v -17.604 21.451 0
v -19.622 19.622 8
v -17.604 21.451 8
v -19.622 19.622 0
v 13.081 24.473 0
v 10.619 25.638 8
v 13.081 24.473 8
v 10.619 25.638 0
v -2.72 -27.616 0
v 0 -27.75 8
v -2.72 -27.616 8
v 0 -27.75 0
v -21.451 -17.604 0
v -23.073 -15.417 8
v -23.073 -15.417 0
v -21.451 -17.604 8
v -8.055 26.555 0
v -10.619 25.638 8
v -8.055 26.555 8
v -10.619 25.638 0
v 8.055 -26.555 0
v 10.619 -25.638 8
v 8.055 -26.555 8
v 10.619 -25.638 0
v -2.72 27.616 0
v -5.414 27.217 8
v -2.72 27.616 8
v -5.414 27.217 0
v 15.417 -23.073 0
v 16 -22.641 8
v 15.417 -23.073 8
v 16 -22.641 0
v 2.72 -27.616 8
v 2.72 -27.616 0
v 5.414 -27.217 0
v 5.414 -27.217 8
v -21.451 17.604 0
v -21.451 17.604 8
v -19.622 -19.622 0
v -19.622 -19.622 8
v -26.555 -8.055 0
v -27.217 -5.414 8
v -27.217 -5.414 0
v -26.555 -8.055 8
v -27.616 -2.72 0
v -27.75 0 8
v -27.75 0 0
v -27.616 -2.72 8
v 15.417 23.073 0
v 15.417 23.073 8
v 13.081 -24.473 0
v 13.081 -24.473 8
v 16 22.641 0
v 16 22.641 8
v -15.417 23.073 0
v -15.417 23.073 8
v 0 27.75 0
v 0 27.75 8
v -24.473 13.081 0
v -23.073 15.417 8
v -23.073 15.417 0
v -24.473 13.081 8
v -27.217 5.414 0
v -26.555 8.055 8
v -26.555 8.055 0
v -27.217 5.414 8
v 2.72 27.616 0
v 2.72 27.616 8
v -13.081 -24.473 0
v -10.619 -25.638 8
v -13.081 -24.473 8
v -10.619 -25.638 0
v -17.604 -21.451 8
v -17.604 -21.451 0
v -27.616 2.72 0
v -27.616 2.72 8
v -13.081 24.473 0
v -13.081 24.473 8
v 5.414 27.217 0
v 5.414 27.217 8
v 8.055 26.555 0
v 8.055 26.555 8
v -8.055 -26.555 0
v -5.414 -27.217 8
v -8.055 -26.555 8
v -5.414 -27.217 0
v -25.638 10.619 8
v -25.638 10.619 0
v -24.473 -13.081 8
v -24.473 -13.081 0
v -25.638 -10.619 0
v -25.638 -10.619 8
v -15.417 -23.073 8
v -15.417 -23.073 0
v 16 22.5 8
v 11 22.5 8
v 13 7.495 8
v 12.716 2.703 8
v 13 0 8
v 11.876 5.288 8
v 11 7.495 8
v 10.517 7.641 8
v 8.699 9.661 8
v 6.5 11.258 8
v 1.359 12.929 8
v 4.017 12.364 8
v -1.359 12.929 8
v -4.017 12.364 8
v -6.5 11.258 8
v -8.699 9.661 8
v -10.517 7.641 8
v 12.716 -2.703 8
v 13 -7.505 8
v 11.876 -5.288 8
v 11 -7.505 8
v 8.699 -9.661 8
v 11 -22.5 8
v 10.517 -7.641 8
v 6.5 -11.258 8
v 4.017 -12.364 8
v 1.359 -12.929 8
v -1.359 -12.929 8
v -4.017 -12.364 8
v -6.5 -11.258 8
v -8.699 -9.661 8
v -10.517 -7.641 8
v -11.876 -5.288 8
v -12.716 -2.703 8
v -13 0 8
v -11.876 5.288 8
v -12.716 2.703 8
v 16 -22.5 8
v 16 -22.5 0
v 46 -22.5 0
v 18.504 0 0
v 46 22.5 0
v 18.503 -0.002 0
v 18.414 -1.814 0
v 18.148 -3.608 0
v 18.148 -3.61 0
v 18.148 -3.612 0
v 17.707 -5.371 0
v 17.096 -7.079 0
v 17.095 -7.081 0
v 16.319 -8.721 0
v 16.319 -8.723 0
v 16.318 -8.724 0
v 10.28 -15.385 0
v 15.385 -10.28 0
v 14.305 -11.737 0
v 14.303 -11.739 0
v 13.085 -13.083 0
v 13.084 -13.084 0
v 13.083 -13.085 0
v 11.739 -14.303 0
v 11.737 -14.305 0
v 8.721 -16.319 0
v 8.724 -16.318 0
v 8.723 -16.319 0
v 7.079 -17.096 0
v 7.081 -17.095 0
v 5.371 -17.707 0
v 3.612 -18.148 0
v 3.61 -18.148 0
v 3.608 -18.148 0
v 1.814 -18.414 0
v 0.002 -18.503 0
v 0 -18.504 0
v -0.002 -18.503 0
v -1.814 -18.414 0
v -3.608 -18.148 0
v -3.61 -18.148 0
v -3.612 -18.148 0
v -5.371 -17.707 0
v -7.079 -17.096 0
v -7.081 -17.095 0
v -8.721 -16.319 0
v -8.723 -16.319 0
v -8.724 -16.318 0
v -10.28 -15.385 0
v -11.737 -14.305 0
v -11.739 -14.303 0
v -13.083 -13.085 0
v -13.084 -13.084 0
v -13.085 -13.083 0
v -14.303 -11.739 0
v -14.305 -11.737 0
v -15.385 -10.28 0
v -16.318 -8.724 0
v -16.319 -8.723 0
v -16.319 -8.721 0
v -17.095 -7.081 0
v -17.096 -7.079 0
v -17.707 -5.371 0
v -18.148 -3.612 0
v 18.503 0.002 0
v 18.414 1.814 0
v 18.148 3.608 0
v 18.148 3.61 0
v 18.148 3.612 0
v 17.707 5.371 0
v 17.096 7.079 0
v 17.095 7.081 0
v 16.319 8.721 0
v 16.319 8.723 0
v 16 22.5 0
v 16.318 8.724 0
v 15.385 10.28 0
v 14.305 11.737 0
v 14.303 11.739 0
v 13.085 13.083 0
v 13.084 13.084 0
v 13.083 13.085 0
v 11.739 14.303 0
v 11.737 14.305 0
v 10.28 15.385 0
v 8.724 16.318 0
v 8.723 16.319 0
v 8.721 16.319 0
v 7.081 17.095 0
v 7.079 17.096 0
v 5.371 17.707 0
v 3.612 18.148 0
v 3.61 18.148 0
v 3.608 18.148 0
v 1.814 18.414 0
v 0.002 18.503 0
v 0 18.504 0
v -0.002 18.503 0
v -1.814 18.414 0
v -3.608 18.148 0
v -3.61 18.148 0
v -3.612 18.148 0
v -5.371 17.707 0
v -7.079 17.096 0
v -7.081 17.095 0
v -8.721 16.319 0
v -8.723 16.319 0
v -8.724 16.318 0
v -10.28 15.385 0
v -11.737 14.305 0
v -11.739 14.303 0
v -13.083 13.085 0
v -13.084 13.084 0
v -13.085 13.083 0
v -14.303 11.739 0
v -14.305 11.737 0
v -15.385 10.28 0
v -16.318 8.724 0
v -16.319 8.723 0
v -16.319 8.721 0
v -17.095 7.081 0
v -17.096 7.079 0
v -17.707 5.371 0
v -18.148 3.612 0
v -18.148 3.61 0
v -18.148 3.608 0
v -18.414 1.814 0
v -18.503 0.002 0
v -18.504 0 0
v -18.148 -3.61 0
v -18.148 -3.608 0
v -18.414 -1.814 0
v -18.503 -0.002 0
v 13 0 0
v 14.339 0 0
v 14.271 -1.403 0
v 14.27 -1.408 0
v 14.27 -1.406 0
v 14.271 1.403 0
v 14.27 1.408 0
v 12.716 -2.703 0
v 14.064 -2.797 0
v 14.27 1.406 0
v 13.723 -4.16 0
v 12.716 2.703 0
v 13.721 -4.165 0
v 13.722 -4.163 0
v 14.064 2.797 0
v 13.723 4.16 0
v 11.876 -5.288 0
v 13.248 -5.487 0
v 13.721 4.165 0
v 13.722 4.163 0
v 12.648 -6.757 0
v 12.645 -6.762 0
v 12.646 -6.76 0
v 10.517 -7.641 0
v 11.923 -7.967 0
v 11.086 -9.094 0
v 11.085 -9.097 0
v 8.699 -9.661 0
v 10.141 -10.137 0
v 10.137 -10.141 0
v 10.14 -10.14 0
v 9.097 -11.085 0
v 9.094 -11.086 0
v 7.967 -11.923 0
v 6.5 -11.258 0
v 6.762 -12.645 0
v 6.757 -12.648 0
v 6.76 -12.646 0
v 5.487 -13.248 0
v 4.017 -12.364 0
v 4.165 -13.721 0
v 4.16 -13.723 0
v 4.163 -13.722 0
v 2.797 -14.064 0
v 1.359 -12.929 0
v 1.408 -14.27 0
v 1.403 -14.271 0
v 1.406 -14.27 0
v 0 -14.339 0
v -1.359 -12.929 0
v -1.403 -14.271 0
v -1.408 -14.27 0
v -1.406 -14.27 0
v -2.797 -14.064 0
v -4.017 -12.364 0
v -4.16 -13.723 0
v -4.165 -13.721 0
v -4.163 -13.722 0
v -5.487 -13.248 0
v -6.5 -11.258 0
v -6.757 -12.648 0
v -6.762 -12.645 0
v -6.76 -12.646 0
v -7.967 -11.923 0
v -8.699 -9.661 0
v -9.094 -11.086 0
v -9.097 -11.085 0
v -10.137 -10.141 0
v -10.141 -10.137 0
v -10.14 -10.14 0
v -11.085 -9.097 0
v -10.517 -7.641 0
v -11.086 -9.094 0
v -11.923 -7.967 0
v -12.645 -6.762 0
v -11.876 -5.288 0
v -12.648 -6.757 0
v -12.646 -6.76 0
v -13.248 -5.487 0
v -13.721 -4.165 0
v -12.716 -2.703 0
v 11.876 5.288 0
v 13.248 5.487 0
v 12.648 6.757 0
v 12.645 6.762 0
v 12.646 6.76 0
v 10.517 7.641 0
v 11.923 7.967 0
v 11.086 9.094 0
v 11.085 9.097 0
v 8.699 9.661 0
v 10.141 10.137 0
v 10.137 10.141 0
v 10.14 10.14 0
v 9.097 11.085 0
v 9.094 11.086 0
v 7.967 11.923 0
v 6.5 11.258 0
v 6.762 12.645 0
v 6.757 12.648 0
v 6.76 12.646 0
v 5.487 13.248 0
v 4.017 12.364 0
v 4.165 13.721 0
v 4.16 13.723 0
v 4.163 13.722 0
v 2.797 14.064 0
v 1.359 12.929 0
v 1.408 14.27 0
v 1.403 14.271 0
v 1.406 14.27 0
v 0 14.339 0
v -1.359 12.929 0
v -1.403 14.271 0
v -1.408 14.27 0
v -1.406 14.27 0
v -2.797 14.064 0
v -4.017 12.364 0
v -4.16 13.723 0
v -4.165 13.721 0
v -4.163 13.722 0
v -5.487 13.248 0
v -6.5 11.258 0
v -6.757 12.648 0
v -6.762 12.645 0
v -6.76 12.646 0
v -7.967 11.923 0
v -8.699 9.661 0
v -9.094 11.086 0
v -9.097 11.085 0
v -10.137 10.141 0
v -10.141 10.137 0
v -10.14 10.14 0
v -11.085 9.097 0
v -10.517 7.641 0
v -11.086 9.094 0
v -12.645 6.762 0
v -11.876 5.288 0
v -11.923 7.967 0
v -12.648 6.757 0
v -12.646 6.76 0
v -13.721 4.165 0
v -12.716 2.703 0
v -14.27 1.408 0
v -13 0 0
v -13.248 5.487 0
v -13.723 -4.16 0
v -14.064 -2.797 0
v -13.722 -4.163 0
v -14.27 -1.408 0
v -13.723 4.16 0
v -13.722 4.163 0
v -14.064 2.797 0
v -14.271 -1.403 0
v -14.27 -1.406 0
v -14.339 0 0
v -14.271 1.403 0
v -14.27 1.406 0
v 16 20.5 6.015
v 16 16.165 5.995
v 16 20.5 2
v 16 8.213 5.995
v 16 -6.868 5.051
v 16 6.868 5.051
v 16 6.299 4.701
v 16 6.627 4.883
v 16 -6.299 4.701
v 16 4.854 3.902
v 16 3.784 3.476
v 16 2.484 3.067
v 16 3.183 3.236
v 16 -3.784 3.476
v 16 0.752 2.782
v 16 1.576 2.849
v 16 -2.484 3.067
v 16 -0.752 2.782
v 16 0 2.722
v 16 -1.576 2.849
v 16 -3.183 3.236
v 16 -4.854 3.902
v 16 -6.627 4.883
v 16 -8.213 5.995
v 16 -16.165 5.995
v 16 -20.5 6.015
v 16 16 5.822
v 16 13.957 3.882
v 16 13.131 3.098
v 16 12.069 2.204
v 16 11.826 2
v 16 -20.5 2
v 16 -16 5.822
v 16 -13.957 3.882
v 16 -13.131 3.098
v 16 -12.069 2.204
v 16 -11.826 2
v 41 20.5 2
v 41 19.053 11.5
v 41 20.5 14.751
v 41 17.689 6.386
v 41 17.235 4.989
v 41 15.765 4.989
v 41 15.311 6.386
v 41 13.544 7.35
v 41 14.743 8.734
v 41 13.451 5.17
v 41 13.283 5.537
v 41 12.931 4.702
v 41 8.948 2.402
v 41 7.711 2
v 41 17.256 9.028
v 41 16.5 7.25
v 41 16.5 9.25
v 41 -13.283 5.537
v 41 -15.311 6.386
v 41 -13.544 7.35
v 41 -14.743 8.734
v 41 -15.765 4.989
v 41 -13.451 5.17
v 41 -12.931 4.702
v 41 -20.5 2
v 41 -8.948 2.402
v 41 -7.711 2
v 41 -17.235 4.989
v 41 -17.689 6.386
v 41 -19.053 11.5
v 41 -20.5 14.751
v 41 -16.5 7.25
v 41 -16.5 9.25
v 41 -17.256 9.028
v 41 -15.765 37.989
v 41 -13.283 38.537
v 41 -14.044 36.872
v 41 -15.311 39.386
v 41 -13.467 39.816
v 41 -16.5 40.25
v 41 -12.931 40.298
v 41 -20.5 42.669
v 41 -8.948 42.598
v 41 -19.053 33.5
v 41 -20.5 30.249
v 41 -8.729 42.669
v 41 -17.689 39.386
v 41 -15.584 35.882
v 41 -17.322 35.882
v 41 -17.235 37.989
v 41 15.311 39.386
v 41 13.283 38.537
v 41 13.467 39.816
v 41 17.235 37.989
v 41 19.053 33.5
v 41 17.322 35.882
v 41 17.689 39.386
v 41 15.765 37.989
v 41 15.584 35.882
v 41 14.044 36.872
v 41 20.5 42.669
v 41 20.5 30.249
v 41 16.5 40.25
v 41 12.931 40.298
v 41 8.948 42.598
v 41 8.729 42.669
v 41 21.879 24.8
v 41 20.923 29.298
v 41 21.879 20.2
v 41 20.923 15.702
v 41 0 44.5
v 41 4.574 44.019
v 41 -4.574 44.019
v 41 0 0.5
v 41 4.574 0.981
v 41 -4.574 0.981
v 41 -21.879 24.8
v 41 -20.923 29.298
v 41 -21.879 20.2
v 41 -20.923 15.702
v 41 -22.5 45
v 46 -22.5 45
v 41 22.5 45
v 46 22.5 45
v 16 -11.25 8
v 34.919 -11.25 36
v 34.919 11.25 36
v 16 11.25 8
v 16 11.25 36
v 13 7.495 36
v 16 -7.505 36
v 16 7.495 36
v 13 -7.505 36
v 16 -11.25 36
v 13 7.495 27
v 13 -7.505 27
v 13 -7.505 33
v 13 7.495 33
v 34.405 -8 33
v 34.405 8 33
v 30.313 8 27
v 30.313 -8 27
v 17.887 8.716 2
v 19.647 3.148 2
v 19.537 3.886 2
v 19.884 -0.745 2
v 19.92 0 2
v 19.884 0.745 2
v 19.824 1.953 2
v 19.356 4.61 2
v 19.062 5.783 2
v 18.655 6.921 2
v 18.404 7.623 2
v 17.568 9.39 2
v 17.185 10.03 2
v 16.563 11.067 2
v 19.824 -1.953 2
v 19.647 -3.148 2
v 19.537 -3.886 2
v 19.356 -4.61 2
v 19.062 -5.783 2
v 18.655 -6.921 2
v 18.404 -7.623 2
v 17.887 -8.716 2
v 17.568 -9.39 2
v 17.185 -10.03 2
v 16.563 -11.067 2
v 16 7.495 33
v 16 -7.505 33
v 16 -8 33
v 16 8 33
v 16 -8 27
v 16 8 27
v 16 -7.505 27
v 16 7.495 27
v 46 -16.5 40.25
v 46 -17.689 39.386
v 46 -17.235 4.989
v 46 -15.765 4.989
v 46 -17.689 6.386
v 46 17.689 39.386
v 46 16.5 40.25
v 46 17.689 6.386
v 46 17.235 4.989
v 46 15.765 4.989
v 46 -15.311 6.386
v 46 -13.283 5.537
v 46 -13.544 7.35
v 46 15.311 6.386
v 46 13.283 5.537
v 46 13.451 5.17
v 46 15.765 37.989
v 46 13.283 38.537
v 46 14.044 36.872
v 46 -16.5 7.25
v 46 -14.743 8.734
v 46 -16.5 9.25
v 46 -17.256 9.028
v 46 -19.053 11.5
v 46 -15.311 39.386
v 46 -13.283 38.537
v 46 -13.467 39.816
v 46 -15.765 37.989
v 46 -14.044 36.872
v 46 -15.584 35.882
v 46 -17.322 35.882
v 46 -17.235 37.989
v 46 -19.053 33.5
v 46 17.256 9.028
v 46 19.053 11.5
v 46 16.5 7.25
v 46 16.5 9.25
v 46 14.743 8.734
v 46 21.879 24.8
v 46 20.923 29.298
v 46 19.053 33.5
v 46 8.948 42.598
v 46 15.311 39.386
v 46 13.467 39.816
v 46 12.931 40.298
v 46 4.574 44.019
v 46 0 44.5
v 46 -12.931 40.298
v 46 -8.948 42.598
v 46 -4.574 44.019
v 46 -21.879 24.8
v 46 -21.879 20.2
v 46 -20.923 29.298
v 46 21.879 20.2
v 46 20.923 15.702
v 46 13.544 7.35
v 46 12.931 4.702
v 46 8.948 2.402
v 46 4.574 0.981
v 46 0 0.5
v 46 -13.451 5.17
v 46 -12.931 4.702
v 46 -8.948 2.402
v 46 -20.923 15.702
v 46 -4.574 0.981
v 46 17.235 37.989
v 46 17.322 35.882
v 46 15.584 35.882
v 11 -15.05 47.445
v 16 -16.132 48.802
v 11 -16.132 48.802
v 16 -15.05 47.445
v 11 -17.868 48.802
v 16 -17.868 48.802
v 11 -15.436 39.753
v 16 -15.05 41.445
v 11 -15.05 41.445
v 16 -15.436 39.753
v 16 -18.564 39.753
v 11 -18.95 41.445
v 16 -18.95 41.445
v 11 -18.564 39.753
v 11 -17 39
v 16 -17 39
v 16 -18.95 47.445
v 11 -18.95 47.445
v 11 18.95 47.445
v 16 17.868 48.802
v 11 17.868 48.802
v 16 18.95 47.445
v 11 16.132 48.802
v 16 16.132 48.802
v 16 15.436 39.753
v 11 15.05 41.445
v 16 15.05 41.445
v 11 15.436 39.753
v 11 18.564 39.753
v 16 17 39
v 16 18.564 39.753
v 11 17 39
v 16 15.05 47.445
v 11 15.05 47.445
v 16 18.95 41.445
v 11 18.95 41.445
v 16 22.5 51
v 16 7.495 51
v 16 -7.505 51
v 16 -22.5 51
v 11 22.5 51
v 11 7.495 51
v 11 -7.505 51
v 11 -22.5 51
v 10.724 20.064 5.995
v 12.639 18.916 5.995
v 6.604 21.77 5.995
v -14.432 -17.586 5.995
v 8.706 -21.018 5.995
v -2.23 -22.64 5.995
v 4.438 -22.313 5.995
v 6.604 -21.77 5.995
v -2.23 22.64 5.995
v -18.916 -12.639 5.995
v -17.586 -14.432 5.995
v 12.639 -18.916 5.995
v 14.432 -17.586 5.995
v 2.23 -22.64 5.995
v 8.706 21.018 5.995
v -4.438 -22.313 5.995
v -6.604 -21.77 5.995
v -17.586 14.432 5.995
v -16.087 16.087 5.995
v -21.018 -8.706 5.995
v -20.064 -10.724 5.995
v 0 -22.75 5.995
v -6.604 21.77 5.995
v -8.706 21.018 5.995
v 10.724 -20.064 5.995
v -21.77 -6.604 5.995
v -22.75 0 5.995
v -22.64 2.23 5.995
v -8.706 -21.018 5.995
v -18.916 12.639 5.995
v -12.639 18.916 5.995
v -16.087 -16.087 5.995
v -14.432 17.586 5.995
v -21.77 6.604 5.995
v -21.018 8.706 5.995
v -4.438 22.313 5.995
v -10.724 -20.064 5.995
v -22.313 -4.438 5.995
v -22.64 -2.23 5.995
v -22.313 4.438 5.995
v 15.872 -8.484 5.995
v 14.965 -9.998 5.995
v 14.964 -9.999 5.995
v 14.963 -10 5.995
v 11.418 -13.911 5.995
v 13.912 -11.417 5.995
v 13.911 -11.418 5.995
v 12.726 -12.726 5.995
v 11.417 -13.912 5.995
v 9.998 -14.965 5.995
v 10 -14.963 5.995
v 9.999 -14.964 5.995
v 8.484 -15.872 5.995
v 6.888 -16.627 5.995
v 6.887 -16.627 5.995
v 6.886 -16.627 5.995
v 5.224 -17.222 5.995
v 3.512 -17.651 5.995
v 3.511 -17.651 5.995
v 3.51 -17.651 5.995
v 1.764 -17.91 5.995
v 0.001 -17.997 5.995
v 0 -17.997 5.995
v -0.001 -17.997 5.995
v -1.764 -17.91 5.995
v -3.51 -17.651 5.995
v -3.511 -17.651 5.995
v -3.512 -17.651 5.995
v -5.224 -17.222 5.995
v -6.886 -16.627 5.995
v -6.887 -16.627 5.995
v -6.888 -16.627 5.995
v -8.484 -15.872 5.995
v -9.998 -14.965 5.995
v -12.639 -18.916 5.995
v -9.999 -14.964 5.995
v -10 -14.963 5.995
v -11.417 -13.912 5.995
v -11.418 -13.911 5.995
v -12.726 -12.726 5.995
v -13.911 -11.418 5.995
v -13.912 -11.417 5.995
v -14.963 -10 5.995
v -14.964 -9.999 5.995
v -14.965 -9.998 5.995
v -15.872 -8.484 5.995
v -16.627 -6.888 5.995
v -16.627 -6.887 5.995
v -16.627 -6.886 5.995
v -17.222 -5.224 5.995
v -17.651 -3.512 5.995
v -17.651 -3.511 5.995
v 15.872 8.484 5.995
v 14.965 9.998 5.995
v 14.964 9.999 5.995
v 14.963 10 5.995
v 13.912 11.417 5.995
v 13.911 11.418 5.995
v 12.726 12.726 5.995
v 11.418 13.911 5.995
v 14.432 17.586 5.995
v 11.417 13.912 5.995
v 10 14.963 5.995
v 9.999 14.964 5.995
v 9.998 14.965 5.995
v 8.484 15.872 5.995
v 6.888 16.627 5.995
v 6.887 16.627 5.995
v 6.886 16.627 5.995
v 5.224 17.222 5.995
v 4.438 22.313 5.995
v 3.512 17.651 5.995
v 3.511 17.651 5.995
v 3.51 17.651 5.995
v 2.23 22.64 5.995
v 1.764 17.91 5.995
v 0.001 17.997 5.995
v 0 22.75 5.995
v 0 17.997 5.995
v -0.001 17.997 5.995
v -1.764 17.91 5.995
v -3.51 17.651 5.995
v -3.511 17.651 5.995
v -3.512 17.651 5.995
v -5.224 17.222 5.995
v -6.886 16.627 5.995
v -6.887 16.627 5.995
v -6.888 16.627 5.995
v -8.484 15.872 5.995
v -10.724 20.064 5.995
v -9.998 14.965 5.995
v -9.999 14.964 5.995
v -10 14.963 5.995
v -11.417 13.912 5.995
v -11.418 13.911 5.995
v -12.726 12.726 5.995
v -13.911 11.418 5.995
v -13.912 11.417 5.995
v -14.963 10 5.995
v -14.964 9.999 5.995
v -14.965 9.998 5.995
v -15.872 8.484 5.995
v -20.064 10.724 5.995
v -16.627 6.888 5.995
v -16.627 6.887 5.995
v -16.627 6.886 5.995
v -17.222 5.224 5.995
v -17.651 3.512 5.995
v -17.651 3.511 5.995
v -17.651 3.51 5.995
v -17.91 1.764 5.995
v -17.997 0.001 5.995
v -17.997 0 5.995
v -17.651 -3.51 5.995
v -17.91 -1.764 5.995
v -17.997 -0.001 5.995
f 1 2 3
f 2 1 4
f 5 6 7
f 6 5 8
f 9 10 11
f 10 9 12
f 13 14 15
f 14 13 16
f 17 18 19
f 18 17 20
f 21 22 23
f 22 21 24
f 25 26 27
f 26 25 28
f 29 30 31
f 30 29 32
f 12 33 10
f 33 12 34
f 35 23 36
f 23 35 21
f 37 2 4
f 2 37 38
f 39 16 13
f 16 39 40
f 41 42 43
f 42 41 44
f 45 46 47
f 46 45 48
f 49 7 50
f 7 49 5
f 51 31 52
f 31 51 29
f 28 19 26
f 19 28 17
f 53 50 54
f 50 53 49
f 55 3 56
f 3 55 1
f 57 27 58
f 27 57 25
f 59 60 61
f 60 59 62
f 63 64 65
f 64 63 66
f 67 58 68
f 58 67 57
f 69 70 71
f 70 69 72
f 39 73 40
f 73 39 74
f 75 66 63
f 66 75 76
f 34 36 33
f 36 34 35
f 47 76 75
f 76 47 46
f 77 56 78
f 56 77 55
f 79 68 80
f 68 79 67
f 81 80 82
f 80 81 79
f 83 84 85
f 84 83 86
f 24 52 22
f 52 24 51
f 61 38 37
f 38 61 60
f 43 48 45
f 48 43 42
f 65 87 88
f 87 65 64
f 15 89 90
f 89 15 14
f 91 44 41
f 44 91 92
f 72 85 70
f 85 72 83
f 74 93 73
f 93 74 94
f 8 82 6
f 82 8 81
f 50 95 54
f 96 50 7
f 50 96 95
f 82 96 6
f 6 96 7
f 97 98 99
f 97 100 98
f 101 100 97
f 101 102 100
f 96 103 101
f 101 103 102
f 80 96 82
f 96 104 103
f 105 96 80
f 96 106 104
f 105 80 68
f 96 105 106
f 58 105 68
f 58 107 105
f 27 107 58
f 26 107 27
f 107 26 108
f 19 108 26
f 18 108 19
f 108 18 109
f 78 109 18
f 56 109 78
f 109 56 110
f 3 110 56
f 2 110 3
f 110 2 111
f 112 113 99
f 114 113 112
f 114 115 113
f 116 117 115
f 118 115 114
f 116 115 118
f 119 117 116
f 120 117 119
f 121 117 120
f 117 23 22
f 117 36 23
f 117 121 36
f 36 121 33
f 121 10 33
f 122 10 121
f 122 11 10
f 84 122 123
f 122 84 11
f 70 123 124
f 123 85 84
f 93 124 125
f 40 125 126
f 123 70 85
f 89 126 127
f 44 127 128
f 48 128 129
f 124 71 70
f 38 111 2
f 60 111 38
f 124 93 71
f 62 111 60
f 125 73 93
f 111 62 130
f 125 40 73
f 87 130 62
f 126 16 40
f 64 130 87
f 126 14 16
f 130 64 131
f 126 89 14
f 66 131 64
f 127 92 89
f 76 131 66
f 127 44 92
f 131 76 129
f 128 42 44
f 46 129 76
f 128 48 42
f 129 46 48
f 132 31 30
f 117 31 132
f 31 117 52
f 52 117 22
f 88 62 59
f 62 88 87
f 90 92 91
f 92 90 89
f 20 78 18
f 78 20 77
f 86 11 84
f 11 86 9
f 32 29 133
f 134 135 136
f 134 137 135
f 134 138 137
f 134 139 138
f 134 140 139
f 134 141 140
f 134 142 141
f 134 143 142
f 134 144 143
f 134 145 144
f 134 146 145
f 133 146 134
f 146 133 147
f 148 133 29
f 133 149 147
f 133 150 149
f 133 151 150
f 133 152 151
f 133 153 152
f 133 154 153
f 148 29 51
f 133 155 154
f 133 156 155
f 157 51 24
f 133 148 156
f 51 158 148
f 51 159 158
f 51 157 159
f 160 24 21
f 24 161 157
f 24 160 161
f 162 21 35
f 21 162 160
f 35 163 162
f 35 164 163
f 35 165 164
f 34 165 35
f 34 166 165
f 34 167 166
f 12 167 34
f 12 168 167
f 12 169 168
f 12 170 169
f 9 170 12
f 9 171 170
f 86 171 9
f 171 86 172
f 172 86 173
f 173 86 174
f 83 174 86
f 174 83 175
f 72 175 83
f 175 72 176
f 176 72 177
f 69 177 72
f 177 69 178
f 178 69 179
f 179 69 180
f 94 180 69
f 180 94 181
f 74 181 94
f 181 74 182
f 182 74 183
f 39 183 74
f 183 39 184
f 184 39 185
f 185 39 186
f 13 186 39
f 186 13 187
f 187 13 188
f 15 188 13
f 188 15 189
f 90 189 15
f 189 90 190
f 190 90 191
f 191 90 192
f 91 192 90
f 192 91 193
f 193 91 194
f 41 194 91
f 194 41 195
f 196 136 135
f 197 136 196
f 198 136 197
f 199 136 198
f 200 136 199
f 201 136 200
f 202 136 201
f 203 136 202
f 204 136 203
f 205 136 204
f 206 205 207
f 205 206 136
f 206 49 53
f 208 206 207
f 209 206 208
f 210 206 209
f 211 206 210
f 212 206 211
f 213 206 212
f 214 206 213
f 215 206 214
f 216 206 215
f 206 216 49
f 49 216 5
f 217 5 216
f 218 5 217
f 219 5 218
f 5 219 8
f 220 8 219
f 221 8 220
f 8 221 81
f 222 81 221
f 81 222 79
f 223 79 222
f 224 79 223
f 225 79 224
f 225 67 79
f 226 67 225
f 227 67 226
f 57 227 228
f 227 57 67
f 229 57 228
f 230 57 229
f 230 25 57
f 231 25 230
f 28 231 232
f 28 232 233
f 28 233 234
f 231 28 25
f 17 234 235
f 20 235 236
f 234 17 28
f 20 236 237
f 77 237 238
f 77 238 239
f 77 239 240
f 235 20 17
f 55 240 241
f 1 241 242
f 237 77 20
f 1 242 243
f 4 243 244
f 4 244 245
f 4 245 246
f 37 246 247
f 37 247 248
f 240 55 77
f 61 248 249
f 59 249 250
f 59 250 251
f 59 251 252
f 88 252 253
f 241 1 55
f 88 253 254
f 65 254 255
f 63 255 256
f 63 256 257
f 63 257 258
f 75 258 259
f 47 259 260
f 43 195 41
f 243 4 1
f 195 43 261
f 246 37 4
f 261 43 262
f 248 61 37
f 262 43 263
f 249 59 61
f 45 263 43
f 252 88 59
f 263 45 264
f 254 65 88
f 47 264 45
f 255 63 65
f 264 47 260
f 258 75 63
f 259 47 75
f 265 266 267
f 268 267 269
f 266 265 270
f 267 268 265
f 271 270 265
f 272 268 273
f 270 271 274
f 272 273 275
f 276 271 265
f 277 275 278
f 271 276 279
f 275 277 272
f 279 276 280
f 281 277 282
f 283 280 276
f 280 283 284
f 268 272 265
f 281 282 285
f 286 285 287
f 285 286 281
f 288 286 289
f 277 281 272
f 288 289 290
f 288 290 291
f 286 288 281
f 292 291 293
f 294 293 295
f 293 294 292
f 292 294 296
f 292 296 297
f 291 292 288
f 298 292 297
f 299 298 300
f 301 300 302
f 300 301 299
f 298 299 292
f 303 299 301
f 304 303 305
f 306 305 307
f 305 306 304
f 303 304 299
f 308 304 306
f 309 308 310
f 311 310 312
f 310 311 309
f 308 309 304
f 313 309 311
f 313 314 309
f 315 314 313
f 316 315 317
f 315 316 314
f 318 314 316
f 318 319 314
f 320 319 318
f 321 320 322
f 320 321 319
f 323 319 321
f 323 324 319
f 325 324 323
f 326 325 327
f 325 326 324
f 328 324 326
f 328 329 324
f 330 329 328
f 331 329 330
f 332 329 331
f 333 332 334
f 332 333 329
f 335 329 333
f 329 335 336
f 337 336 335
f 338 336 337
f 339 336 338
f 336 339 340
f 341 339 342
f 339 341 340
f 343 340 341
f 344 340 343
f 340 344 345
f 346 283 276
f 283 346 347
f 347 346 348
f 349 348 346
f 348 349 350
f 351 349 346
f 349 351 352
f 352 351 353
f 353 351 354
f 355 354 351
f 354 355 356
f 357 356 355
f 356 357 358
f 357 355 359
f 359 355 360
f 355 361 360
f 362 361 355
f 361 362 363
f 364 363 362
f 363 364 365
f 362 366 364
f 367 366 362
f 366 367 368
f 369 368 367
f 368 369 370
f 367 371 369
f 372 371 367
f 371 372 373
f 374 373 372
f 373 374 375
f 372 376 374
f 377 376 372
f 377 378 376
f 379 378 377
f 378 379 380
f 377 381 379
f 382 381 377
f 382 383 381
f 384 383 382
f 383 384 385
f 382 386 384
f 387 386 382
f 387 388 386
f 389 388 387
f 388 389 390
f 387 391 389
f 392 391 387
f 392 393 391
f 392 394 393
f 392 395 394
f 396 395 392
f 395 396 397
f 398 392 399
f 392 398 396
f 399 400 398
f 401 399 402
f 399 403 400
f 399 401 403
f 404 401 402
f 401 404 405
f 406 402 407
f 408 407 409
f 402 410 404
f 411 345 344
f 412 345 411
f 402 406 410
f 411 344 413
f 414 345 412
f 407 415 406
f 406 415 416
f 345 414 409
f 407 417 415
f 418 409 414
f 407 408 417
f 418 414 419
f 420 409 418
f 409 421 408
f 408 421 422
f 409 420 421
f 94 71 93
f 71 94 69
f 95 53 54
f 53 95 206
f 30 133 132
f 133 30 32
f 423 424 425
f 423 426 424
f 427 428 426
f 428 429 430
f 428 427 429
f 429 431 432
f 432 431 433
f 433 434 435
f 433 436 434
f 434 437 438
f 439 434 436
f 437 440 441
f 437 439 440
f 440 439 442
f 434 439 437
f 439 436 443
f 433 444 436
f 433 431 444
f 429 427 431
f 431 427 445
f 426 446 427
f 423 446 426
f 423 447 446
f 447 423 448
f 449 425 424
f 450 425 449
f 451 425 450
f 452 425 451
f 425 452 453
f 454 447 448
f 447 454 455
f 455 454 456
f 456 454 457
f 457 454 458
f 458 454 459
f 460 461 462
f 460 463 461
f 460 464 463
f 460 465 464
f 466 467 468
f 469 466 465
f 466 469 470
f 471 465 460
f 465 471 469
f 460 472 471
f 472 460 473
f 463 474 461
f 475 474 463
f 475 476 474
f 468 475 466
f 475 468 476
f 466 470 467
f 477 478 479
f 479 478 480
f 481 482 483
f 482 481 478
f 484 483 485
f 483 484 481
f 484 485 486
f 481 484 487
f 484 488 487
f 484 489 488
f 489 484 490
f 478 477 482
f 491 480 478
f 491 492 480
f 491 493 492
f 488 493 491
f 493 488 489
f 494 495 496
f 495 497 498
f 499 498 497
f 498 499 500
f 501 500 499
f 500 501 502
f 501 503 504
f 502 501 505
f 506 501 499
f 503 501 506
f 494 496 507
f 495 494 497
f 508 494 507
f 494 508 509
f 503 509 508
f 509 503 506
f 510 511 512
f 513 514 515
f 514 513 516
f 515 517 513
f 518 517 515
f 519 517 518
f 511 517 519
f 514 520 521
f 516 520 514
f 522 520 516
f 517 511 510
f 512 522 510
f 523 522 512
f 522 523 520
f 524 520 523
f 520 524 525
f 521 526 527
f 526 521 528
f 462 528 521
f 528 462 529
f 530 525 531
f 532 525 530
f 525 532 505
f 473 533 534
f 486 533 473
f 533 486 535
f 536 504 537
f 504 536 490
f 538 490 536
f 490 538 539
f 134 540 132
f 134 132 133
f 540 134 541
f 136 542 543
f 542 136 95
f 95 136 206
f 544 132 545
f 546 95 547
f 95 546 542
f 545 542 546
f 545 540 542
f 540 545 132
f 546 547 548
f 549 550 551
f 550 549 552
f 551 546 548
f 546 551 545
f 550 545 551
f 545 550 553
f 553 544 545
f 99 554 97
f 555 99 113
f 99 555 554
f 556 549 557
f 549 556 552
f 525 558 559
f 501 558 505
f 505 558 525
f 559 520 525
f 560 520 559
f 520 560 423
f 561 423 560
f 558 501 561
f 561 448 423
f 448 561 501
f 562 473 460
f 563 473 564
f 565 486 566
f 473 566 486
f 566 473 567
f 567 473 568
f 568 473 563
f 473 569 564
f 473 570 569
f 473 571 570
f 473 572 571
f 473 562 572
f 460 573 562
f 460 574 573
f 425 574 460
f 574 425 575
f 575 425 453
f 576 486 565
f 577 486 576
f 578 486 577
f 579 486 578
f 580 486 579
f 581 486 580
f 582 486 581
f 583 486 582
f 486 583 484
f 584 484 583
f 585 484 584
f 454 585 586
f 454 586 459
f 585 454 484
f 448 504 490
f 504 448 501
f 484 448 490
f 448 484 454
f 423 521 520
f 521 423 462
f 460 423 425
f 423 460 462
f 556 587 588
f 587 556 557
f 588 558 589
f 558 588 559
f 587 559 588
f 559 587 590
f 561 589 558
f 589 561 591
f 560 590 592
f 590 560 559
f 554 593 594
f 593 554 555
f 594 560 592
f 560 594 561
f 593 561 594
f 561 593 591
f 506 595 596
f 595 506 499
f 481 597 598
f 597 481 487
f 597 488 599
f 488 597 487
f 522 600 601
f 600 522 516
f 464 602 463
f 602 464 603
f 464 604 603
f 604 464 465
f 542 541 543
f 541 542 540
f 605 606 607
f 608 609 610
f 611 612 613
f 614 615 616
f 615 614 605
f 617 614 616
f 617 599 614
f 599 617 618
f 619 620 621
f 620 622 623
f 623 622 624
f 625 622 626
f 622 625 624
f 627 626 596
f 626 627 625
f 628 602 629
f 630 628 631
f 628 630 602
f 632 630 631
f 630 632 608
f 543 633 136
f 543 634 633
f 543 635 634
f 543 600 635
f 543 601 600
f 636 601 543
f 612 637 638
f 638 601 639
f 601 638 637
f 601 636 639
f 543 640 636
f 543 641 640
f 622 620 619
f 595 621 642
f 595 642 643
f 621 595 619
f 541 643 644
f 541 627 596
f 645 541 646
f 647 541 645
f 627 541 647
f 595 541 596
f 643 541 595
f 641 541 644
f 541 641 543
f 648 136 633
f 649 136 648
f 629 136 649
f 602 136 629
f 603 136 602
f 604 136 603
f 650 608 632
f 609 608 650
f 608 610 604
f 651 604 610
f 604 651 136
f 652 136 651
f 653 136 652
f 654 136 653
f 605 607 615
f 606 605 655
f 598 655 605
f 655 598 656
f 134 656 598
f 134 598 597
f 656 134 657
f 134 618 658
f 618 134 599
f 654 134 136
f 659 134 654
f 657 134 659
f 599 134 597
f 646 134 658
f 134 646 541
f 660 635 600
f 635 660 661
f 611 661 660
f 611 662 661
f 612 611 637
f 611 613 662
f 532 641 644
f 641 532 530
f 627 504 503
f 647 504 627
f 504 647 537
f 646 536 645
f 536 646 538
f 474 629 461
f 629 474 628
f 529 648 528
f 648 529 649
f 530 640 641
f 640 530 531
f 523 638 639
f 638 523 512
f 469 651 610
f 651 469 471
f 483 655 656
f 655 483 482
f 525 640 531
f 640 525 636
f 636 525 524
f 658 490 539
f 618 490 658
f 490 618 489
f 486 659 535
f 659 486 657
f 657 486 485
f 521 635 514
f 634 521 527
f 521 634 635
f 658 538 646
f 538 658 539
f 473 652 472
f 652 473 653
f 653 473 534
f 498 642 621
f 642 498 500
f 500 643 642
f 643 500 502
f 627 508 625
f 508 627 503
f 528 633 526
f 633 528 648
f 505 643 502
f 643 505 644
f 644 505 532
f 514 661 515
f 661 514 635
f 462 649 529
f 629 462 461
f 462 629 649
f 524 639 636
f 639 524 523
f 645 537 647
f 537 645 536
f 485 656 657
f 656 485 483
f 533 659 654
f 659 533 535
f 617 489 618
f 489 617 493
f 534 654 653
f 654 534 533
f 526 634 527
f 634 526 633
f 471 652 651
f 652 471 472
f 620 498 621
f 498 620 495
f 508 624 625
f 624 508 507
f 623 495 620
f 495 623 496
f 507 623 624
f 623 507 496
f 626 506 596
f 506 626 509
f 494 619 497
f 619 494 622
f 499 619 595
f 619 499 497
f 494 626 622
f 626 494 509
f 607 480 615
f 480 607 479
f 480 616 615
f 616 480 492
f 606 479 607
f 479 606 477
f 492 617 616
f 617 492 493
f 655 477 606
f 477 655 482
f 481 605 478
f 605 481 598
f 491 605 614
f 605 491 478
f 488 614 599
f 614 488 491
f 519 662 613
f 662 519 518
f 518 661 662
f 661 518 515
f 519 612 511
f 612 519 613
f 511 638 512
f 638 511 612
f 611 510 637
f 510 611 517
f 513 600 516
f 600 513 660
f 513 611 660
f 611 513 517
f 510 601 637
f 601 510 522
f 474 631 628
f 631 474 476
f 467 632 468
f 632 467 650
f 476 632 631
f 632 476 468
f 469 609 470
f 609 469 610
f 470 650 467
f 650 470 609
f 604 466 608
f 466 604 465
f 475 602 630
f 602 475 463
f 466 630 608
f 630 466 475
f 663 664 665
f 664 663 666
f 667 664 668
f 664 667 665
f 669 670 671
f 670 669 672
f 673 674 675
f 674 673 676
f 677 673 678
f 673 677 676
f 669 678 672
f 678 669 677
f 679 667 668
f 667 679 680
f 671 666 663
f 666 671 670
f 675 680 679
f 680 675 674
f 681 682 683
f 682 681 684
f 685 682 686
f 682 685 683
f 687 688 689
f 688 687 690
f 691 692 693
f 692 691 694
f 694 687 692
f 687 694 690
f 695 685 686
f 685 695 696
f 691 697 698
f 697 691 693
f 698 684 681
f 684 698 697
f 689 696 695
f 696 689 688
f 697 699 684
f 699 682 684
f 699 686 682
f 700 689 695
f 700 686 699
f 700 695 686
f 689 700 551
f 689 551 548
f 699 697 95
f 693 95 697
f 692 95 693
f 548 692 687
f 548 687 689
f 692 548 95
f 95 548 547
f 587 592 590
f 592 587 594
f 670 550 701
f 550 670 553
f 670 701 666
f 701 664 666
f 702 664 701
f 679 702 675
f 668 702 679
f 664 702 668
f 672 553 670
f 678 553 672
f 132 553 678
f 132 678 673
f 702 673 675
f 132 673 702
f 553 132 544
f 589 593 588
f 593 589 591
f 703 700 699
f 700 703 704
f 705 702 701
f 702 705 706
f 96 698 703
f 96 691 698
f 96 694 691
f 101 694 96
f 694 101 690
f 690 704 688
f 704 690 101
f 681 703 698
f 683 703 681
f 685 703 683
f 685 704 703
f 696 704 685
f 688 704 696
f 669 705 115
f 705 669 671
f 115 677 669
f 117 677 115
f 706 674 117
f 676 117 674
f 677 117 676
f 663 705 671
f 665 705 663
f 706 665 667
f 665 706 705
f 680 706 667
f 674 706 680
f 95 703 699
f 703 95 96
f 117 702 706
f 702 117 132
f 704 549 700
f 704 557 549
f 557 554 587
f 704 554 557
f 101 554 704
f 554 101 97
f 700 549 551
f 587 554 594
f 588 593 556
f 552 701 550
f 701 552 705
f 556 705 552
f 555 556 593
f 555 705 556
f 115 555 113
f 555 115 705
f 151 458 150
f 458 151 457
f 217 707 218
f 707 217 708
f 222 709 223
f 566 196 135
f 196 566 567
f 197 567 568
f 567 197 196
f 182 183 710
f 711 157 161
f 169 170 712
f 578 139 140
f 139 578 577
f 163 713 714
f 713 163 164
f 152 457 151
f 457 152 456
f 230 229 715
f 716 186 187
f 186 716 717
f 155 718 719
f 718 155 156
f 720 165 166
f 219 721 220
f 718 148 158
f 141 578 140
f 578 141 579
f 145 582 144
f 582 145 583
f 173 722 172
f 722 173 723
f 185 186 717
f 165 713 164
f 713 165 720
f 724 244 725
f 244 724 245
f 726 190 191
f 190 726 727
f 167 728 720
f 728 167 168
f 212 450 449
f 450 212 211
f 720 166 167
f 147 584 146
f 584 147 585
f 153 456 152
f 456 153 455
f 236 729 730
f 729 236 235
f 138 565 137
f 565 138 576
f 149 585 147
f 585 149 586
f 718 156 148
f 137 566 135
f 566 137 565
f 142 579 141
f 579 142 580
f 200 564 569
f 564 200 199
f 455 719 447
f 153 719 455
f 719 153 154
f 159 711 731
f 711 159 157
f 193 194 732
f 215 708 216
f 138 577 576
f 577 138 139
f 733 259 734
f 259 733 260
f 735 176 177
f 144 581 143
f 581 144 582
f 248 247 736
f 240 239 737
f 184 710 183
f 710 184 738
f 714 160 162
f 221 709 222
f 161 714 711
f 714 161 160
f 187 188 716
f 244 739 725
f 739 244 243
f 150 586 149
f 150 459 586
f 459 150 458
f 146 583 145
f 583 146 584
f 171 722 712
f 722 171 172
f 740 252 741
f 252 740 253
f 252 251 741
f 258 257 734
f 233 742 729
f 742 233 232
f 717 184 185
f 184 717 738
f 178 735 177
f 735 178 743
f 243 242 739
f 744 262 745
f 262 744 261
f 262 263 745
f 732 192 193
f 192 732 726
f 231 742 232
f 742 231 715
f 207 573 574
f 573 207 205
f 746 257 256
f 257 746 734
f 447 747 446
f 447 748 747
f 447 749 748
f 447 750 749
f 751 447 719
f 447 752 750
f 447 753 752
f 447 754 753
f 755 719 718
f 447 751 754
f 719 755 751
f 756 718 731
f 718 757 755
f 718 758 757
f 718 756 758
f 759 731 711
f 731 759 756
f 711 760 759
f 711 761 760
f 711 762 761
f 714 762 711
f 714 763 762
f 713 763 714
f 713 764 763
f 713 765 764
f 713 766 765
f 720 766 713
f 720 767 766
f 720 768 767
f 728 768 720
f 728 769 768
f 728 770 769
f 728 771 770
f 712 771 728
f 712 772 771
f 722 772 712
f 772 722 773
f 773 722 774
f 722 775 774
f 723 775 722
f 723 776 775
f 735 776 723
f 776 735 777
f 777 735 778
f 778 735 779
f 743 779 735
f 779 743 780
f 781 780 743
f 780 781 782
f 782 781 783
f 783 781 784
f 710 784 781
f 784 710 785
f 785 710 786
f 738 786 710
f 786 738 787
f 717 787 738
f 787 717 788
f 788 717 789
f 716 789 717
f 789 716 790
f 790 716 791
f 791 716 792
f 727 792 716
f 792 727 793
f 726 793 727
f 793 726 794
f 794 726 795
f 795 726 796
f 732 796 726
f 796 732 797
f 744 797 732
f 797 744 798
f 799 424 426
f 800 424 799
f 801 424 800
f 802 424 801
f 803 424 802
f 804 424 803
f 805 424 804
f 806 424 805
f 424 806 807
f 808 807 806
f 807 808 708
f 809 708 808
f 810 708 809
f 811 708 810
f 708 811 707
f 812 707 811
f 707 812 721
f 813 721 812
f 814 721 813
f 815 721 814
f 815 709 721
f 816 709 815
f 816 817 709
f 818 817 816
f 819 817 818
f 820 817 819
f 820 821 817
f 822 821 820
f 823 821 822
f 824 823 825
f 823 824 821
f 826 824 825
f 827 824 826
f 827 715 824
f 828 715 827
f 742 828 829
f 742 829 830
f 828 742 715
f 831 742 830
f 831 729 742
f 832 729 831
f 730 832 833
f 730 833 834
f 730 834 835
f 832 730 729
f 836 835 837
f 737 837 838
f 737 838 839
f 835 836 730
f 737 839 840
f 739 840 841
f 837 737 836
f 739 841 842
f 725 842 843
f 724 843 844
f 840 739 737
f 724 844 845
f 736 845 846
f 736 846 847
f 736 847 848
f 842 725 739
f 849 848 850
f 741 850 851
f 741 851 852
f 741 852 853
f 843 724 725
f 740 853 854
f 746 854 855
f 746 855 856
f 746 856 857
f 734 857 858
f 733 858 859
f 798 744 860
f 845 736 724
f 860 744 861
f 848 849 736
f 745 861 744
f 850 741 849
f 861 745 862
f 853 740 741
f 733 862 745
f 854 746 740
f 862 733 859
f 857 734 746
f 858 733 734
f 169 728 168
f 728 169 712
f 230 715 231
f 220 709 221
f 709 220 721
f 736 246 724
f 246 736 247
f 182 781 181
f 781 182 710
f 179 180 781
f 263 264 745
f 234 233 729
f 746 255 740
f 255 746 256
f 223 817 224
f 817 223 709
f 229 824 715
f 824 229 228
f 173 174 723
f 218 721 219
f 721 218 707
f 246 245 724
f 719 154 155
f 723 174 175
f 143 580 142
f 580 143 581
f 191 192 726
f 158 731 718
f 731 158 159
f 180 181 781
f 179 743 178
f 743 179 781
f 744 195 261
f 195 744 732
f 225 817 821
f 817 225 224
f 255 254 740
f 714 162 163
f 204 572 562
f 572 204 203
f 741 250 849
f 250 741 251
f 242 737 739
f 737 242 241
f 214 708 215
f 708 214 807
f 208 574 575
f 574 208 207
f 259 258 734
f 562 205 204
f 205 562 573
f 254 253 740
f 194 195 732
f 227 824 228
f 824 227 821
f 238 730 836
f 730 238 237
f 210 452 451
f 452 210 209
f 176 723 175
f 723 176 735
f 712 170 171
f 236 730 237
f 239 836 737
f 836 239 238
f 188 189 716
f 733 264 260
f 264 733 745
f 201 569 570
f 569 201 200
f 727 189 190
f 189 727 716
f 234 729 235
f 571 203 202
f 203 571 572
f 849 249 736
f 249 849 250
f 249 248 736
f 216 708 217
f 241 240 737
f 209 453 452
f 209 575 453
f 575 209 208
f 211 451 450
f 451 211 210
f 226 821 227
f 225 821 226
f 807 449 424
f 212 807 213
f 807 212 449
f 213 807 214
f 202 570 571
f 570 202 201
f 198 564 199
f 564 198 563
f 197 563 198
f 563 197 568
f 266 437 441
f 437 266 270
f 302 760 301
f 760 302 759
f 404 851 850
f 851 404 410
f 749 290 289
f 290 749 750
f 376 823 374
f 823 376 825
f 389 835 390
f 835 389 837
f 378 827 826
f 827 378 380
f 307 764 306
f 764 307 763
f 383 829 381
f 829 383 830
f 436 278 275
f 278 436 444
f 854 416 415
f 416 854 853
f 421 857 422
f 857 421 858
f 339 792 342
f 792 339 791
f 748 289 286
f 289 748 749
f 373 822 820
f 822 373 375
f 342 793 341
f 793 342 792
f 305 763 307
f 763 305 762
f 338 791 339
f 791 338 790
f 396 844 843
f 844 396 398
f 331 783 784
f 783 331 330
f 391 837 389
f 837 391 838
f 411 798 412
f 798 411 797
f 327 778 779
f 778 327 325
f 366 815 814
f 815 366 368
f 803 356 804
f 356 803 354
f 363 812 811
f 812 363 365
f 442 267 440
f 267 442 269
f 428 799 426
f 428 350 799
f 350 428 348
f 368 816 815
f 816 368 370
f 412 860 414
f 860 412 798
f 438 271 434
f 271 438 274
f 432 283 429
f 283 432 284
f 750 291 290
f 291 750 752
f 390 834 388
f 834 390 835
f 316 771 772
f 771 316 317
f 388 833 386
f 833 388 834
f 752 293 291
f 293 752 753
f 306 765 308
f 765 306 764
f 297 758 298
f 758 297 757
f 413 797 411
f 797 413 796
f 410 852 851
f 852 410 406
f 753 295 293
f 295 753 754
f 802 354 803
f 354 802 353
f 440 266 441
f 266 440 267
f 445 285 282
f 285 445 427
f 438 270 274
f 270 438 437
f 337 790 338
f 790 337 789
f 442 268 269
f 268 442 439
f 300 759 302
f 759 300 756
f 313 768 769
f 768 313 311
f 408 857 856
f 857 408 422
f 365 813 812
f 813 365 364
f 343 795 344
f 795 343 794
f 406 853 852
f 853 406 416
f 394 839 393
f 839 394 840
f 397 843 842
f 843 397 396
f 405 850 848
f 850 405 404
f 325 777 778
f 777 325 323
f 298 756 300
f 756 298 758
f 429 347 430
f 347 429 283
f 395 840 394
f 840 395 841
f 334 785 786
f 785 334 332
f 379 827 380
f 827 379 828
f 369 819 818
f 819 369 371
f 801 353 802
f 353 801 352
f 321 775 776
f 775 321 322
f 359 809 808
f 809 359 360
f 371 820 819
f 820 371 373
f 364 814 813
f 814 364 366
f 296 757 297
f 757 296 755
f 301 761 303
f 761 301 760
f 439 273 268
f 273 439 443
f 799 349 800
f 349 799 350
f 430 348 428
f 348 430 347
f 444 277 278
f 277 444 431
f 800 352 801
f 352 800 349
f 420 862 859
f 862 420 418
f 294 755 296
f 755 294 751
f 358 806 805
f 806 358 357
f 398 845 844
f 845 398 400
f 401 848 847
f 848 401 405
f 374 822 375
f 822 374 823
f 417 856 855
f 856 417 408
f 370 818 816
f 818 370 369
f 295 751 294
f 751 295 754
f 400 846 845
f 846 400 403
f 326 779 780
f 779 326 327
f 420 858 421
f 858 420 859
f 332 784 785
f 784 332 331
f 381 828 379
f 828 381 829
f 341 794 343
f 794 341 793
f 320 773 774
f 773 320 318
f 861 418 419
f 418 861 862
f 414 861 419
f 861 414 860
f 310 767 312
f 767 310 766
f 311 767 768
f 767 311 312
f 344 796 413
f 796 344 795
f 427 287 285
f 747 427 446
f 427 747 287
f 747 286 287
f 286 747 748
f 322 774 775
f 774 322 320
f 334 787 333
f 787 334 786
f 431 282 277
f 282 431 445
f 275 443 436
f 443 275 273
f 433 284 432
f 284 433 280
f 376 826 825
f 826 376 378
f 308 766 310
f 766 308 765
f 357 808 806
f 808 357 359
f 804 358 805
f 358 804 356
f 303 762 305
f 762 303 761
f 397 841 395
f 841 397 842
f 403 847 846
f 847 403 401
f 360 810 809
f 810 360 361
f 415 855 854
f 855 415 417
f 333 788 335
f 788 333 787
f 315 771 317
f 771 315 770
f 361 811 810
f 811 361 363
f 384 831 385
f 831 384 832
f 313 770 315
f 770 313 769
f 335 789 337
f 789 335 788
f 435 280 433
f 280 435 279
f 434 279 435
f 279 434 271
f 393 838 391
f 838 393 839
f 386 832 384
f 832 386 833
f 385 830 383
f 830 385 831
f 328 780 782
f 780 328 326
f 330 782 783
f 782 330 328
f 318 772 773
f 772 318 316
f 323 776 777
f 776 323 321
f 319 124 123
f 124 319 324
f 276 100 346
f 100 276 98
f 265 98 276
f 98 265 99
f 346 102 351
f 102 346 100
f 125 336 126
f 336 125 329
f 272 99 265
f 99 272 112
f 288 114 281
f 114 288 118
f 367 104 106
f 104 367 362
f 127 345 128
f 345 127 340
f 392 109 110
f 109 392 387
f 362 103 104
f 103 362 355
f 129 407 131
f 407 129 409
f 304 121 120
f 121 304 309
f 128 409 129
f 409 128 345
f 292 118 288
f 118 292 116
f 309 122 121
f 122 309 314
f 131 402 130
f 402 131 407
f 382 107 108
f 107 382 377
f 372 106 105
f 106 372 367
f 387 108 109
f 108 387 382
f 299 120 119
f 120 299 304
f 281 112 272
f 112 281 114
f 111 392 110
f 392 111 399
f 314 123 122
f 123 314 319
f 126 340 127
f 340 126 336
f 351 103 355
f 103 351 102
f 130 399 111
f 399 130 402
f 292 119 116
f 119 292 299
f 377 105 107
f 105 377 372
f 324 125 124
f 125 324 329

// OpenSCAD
///////////////////////////////
// USER PARAMETERS
///////////////////////////////
bolt_dia=4;


blower_od =55.5;
blower_id=26;
blower_height=8;
blower_wall_thcikness=3;
blower_top_bottom_thickness=2;

duct_length=25;
duct_height=45;
duct_width=45;
duct_wall_thcikness=3;

slit_width=5;

fan_width=40;
fan_thickness=8 ;
fan_bolt_dia=2.5;
fan_bolt_dist=33;
fan_mount_angle=0;
fan_mount_thickness=5;

focus_dia= 32 ;
focus_aperture=5;

main_mount_bolt_dia=4;
main_mount_bolt_dist= 34;
main_mount_bolts_height=44;//distance between mount point and where the lower part of the blower should be
main_mount_height = main_mount_bolts_height+7-blower_height;
main_mount_thickness=5;

main_mount_center_dist=11;

cold_end_target_height=14;//negative, from mount points
cold_pt = main_mount_bolts_height-cold_end_target_height;
cold_tunnel_height=6;
cold_tunnel_wall_thickness=3;
cold_tunnerl_width=16;

echo("cold",cold_pt);
xtra=0.01;
// //////////////////////////////
//  USAGE EXAMPLE
// //////////////////////////////



fan_duct(blower_height);
//mounter();


			
		

// //////////////////////////////
// OpenSCAD SCRIPT
// //////////////////////////////
module fan_duct(height=10)
{
	
	duct_hole_width = duct_width -duct_wall_thcikness*2;

	blower_hole_height=blower_height-blower_top_bottom_thickness*2;

	duct_start_offset=blower_id/2;
	blower_cutoff_lng= blower_od/2 - duct_start_offset;

	blower_inner_height =blower_height-blower_top_bottom_thickness;
	blower_join_cut_width=blower_od-27;

	difference()
	{
		union()
		{
			difference()
			{
				cylinder(r=blower_od/2,h=height, $fn=64);
				translate([duct_start_offset+blower_wall_thcikness,-blower_od/2,-xtra/2])cube([blower_cutoff_lng,blower_od,height+xtra]);
				translate([duct_start_offset+blower_wall_thcikness,-blower_join_cut_width/2,blower_top_bottom_thickness-xtra/2])cube([blower_cutoff_lng,blower_join_cut_width,blower_hole_height+xtra]);
				
			}
			
			translate([duct_start_offset+duct_length+blower_wall_thcikness,0,0]) duct(duct_length,duct_width,fan_mount_angle);

			translate([main_mount_center_dist+main_mount_thickness/2,0,height])  mounter(main_mount_thickness);

		}
		
		//blower central hole
		translate([0,0,-xtra/2])   cylinder(r=blower_id/2,h=height +xtra);
		//blower inner hole
		translate([0,0,-xtra/2])  blower_hole(blower_inner_height);

		//cut off , helper
		//translate([0,0,-xtra/2])  cube([100,100,50]);
	}
}

module duct(length=60, width=45,front_angle=60, slope_length = 45,wall_thickness=2)
{
	height = sin(90-front_angle) * slope_length;
	offset= height / tan(90-front_angle);
	inner_offset= (height-wall_thickness*2) / tan(90-front_angle);
	
	echo(height);
	echo(offset);
	echo(inner_offset);

	cold_top= cold_pt+ cold_tunnel_height/2+cold_tunnel_wall_thickness;

	rotate([0,-90,90])
	difference()
	{
		union()
		{
		linear_extrude(height = width, center = true, convexity = 50, twist = 0)
		{
			polygon(points = 
			[[0,-offset]
			,[0,length]
			,[blower_height,length]
			,[height,0]
			]
			,paths = [[0,1,2,3]]);
		}

		//cold zone blower outer 
		linear_extrude(height = width/2, center = true, convexity = 50, twist = 0)
		{
			polygon(points = 
			[[cold_top,0]
			,[0,length+main_mount_thickness-2]
			,[cold_top,length+main_mount_thickness-2]
			]
			,paths = [[0,1,2]]);
		}
		
		}

		//duct inner hole
		linear_extrude(height = width-wall_thickness*2, center = true, convexity = 50, twist = 0)
		{
			polygon(points = 
			[[wall_thickness,-inner_offset-5]
			,[wall_thickness,length+xtra]
			,[blower_height-wall_thickness,length+xtra]
			,[height-wall_thickness+7,-5]
			]
			,paths = [[0,1,2,3]]);
		}

		//cold zone blower inner hole 
		translate([cold_top-cold_tunnel_height/2-cold_tunnel_wall_thickness,length/2,0])   cube([cold_tunnel_height,length*2,cold_tunnerl_width],center=true);

	}

	translate([offset,0,0])  
	rotate([0,90-front_angle,0])  fan_mount(thickness=fan_mount_thickness);

	
}


module fan_mount(width=45, thickness=10, mount_walls=2, center_hole_dia=44)
{
	translate([-duct_height/2,0,thickness/2]) rotate([0,90,0])
	{

	difference()
	{
		cube([thickness,width,duct_height],center=true);
		translate([-thickness/2-xtra/2,0,0])rotate([0,90,0]) cylinder(r=center_hole_dia/2,h=thickness+xtra);

		for(i= [-1,1]) for(j= [-1,1])
		translate([-thickness/2,i*fan_bolt_dist/2,j*fan_bolt_dist/2])
		rotate([0,90,0])translate([0,0,-xtra/2])cylinder(r=fan_bolt_dia/2,h=thickness+xtra);
	}
	
	
	for(i= [-1,1]) for(j= [-1,1])
	translate([-thickness/2,i*fan_bolt_dist/2,j*fan_bolt_dist/2])
	rotate([0,90,0])
	difference()
	{
		cylinder(r=fan_bolt_dia/2+mount_walls,h=thickness);
		translate([0,0,-xtra/2])cylinder(r=fan_bolt_dia/2,h=thickness+xtra);
	}
	}
}





module blower_hole(height=10)
{
	
	difference()
	{
		cylinder(r2=blower_od/2-blower_wall_thcikness-2, r1=focus_dia/2+focus_aperture/2, h=height , $fn=64 );
		translate([0,0,-xtra/2]) cylinder(r1=focus_dia/2-focus_aperture/3, r2 =blower_id/2+blower_wall_thcikness+2, h=height +xtra , $fn=64);
	}

	/*translate([0,0,-height])
	difference()
	{
		//cylinder(r2=focus_dia/2, r1=blower_od/2-blower_wall_thcikness,h=height );
		//translate([0,0,-xtra/2]) cylinder(r2=focus_dia/2-focus_aperture, r1= blower_id/2+blower_wall_thcikness, h=height +xtra);
		cylinder(r=focus_dia/2,h=height );
		translate([0,0,-xtra/2]) cylinder(r=focus_dia/2-focus_aperture,h=height +xtra);
		
	}*/
}


module mounter(thickness=5, slit_height=10)
{
	difference()
	{
		translate([0,0,main_mount_height/2]) cube([thickness, duct_width, main_mount_height],center=true);
		for(i= [-1,1])
		{
		translate([-xtra/2-thickness/2,main_mount_bolt_dist/2*i-main_mount_bolt_dia/2,main_mount_bolts_height+slit_height/2-blower_height]) rotate([0,90,0])
		 rounded_rect([slit_height,main_mount_bolt_dia,thickness+xtra],2);

		}

		translate([0,-xtra/2,main_mount_height/2]) cube([thickness+xtra, 15, main_mount_height+xtra],center=true);
	}
}

module rounded_rect(size, radius) 
{  
x = size[0];  
y = size[1];  
z = size[2];  
 
linear_extrude(height=z)  
hull() {  
translate([radius, radius, 0])  
circle(r=radius);  
 
translate([x - radius, radius, 0])  
circle(r=radius);  
 
translate([x - radius, y - radius, 0])  
circle(r=radius);  
 
translate([radius, y - radius, 0])  
circle(r=radius);  
}  
}
